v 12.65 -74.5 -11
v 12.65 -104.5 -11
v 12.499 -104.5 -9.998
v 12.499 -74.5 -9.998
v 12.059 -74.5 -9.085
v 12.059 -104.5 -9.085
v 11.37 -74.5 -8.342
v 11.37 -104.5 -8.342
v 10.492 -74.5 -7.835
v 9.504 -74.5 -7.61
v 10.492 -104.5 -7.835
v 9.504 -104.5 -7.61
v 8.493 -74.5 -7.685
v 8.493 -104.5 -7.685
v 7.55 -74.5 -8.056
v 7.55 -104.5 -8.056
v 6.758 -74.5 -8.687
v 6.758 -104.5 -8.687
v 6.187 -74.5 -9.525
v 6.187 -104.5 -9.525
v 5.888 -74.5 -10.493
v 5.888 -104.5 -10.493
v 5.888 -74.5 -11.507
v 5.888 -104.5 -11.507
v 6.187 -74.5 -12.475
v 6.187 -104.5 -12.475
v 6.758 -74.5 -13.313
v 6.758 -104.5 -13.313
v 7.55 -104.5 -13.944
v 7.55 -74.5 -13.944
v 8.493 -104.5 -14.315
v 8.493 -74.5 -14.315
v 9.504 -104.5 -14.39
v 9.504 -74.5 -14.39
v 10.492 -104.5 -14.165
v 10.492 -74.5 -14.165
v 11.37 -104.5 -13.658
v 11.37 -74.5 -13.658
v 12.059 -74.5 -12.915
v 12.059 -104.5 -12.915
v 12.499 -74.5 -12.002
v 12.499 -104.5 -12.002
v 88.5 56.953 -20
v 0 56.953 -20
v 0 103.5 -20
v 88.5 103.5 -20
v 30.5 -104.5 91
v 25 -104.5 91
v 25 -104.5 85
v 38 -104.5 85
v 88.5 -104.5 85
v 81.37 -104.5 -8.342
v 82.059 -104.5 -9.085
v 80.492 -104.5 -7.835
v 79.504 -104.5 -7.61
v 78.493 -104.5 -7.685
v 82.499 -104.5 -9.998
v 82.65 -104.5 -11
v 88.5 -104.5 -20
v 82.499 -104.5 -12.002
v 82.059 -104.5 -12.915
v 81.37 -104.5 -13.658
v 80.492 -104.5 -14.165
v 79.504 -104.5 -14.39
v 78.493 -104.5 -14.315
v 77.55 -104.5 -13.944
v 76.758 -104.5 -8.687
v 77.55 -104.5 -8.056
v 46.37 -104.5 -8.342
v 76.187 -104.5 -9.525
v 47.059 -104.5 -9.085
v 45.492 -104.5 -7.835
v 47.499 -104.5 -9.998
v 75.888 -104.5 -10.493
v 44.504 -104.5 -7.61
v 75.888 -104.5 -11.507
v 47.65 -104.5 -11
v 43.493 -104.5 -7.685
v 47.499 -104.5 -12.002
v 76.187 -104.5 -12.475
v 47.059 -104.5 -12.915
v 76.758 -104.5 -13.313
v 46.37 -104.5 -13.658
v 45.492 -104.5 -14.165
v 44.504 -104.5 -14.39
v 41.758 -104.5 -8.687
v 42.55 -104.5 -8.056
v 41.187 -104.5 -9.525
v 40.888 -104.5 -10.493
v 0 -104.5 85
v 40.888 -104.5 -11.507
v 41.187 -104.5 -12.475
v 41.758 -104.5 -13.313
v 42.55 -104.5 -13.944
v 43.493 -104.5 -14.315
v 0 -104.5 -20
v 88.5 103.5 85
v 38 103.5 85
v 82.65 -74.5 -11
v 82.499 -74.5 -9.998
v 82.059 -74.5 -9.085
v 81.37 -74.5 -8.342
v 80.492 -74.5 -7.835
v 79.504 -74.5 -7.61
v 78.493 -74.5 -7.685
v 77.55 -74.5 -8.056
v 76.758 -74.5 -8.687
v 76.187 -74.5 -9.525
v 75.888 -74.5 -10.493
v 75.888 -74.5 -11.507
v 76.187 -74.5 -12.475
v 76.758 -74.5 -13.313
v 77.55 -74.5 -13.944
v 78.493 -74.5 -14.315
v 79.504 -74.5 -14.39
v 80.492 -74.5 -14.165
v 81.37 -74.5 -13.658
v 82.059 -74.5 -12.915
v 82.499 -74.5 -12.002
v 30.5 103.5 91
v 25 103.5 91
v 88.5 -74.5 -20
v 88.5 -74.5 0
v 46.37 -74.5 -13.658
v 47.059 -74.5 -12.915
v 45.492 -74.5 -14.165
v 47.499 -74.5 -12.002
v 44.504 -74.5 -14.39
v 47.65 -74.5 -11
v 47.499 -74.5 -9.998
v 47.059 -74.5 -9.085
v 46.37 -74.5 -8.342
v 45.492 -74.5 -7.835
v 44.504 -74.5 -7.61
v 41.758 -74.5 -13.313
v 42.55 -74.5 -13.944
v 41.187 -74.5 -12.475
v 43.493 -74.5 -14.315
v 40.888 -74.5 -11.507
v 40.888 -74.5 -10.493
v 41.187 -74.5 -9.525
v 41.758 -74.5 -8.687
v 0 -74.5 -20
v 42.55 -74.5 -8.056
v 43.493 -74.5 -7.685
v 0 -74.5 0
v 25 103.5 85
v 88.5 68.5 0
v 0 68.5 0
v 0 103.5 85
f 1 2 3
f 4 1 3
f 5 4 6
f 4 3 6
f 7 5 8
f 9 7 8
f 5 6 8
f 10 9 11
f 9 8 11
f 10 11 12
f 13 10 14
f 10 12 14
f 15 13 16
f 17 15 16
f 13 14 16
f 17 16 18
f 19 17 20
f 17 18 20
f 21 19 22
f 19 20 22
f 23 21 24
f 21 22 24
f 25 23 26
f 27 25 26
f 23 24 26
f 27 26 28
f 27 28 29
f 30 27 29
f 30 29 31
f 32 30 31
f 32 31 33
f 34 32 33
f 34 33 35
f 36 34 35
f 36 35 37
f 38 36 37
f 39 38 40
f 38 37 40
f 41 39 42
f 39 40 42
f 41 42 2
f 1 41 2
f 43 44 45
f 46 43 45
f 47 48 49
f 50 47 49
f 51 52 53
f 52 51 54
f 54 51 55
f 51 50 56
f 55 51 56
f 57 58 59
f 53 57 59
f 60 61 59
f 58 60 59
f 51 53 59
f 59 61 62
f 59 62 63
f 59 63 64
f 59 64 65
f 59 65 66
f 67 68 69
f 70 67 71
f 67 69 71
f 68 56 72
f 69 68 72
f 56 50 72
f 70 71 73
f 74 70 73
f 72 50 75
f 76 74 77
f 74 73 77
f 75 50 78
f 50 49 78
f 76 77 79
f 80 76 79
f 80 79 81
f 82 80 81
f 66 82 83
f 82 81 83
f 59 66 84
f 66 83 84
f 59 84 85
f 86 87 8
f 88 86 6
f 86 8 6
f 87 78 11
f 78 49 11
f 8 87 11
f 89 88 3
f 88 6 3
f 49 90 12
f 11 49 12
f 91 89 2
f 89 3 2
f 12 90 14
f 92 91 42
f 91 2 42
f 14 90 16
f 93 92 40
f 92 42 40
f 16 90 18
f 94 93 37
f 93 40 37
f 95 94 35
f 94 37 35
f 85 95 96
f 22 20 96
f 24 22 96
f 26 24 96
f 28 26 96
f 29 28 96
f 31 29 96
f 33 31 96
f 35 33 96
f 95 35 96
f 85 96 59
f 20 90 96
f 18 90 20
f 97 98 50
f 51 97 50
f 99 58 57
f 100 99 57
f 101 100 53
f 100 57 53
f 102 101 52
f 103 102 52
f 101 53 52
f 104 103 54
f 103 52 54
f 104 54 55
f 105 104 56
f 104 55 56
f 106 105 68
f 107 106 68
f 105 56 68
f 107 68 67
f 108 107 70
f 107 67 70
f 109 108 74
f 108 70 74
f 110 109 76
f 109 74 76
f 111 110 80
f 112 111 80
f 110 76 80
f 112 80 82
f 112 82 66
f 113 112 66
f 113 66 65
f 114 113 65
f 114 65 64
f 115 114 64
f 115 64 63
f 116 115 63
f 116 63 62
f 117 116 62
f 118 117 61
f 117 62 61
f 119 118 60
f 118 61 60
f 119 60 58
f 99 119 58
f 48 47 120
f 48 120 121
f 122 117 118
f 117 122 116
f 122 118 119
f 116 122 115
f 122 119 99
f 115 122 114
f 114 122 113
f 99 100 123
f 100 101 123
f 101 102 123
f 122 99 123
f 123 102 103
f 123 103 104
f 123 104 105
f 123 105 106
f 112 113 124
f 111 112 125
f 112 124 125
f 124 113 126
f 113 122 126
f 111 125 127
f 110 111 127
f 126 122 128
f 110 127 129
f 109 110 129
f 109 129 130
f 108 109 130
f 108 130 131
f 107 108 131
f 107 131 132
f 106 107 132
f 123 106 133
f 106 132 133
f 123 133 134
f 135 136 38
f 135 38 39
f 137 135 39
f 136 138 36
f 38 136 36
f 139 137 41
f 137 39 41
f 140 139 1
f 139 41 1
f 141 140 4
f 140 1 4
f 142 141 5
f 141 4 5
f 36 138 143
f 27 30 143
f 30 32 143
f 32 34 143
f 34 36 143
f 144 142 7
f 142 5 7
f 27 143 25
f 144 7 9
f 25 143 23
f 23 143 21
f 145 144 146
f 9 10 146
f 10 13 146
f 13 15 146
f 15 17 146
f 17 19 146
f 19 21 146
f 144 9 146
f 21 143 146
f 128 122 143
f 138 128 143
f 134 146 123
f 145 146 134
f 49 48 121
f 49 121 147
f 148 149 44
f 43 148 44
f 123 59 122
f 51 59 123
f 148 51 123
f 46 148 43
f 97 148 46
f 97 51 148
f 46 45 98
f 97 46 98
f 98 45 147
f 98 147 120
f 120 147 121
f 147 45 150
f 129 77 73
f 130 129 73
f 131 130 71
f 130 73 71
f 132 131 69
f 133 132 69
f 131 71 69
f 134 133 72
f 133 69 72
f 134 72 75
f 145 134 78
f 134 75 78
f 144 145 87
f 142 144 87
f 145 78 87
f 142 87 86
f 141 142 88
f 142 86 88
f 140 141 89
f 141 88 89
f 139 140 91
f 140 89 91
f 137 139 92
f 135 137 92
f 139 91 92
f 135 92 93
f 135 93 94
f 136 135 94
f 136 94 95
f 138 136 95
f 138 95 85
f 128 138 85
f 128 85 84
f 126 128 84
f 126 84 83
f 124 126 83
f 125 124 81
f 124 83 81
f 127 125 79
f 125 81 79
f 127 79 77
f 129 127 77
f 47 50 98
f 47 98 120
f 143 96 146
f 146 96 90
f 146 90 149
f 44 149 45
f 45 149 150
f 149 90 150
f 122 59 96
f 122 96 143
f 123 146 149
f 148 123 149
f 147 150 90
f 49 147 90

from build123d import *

# Parameters (mm, degrees)
F1_DEPTH = 88.5
F2_R     = 3.4
F3_DEPTH = 30
F5_DEPTH = 208


with BuildPart() as f1:
    # F0 (on Right) → F1 (new body)
    with BuildSketch(Plane.YZ):
        Polygon((-74.5, 0), (68.5, 0), (56.952995, -20), (103.5, -20), (103.5, 85), (-104.5, 85), (-104.5, -20), (-74.5, -20), align=None)
    extrude(amount=F1_DEPTH)

    # F2 (on face) → F3 (cut, through all)
    with BuildSketch(Plane.XZ.offset(104.5)):
        with Locations((9.25, -11)):
            Circle(F2_R)
        with Locations((44.25, -11)):
            Circle(F2_R)
        with Locations((79.25, -11)):
            Circle(F2_R)
    extrude(amount=-F3_DEPTH, mode=Mode.SUBTRACT)

    # F4 (on face) → F5 (join, through all)
    with BuildSketch(Plane.XZ.offset(104.5)):
        Polygon((25, 91), (25, 85), (38, 85), (30.5, 91), align=None)
    extrude(amount=-F5_DEPTH)


solid = f1.part
